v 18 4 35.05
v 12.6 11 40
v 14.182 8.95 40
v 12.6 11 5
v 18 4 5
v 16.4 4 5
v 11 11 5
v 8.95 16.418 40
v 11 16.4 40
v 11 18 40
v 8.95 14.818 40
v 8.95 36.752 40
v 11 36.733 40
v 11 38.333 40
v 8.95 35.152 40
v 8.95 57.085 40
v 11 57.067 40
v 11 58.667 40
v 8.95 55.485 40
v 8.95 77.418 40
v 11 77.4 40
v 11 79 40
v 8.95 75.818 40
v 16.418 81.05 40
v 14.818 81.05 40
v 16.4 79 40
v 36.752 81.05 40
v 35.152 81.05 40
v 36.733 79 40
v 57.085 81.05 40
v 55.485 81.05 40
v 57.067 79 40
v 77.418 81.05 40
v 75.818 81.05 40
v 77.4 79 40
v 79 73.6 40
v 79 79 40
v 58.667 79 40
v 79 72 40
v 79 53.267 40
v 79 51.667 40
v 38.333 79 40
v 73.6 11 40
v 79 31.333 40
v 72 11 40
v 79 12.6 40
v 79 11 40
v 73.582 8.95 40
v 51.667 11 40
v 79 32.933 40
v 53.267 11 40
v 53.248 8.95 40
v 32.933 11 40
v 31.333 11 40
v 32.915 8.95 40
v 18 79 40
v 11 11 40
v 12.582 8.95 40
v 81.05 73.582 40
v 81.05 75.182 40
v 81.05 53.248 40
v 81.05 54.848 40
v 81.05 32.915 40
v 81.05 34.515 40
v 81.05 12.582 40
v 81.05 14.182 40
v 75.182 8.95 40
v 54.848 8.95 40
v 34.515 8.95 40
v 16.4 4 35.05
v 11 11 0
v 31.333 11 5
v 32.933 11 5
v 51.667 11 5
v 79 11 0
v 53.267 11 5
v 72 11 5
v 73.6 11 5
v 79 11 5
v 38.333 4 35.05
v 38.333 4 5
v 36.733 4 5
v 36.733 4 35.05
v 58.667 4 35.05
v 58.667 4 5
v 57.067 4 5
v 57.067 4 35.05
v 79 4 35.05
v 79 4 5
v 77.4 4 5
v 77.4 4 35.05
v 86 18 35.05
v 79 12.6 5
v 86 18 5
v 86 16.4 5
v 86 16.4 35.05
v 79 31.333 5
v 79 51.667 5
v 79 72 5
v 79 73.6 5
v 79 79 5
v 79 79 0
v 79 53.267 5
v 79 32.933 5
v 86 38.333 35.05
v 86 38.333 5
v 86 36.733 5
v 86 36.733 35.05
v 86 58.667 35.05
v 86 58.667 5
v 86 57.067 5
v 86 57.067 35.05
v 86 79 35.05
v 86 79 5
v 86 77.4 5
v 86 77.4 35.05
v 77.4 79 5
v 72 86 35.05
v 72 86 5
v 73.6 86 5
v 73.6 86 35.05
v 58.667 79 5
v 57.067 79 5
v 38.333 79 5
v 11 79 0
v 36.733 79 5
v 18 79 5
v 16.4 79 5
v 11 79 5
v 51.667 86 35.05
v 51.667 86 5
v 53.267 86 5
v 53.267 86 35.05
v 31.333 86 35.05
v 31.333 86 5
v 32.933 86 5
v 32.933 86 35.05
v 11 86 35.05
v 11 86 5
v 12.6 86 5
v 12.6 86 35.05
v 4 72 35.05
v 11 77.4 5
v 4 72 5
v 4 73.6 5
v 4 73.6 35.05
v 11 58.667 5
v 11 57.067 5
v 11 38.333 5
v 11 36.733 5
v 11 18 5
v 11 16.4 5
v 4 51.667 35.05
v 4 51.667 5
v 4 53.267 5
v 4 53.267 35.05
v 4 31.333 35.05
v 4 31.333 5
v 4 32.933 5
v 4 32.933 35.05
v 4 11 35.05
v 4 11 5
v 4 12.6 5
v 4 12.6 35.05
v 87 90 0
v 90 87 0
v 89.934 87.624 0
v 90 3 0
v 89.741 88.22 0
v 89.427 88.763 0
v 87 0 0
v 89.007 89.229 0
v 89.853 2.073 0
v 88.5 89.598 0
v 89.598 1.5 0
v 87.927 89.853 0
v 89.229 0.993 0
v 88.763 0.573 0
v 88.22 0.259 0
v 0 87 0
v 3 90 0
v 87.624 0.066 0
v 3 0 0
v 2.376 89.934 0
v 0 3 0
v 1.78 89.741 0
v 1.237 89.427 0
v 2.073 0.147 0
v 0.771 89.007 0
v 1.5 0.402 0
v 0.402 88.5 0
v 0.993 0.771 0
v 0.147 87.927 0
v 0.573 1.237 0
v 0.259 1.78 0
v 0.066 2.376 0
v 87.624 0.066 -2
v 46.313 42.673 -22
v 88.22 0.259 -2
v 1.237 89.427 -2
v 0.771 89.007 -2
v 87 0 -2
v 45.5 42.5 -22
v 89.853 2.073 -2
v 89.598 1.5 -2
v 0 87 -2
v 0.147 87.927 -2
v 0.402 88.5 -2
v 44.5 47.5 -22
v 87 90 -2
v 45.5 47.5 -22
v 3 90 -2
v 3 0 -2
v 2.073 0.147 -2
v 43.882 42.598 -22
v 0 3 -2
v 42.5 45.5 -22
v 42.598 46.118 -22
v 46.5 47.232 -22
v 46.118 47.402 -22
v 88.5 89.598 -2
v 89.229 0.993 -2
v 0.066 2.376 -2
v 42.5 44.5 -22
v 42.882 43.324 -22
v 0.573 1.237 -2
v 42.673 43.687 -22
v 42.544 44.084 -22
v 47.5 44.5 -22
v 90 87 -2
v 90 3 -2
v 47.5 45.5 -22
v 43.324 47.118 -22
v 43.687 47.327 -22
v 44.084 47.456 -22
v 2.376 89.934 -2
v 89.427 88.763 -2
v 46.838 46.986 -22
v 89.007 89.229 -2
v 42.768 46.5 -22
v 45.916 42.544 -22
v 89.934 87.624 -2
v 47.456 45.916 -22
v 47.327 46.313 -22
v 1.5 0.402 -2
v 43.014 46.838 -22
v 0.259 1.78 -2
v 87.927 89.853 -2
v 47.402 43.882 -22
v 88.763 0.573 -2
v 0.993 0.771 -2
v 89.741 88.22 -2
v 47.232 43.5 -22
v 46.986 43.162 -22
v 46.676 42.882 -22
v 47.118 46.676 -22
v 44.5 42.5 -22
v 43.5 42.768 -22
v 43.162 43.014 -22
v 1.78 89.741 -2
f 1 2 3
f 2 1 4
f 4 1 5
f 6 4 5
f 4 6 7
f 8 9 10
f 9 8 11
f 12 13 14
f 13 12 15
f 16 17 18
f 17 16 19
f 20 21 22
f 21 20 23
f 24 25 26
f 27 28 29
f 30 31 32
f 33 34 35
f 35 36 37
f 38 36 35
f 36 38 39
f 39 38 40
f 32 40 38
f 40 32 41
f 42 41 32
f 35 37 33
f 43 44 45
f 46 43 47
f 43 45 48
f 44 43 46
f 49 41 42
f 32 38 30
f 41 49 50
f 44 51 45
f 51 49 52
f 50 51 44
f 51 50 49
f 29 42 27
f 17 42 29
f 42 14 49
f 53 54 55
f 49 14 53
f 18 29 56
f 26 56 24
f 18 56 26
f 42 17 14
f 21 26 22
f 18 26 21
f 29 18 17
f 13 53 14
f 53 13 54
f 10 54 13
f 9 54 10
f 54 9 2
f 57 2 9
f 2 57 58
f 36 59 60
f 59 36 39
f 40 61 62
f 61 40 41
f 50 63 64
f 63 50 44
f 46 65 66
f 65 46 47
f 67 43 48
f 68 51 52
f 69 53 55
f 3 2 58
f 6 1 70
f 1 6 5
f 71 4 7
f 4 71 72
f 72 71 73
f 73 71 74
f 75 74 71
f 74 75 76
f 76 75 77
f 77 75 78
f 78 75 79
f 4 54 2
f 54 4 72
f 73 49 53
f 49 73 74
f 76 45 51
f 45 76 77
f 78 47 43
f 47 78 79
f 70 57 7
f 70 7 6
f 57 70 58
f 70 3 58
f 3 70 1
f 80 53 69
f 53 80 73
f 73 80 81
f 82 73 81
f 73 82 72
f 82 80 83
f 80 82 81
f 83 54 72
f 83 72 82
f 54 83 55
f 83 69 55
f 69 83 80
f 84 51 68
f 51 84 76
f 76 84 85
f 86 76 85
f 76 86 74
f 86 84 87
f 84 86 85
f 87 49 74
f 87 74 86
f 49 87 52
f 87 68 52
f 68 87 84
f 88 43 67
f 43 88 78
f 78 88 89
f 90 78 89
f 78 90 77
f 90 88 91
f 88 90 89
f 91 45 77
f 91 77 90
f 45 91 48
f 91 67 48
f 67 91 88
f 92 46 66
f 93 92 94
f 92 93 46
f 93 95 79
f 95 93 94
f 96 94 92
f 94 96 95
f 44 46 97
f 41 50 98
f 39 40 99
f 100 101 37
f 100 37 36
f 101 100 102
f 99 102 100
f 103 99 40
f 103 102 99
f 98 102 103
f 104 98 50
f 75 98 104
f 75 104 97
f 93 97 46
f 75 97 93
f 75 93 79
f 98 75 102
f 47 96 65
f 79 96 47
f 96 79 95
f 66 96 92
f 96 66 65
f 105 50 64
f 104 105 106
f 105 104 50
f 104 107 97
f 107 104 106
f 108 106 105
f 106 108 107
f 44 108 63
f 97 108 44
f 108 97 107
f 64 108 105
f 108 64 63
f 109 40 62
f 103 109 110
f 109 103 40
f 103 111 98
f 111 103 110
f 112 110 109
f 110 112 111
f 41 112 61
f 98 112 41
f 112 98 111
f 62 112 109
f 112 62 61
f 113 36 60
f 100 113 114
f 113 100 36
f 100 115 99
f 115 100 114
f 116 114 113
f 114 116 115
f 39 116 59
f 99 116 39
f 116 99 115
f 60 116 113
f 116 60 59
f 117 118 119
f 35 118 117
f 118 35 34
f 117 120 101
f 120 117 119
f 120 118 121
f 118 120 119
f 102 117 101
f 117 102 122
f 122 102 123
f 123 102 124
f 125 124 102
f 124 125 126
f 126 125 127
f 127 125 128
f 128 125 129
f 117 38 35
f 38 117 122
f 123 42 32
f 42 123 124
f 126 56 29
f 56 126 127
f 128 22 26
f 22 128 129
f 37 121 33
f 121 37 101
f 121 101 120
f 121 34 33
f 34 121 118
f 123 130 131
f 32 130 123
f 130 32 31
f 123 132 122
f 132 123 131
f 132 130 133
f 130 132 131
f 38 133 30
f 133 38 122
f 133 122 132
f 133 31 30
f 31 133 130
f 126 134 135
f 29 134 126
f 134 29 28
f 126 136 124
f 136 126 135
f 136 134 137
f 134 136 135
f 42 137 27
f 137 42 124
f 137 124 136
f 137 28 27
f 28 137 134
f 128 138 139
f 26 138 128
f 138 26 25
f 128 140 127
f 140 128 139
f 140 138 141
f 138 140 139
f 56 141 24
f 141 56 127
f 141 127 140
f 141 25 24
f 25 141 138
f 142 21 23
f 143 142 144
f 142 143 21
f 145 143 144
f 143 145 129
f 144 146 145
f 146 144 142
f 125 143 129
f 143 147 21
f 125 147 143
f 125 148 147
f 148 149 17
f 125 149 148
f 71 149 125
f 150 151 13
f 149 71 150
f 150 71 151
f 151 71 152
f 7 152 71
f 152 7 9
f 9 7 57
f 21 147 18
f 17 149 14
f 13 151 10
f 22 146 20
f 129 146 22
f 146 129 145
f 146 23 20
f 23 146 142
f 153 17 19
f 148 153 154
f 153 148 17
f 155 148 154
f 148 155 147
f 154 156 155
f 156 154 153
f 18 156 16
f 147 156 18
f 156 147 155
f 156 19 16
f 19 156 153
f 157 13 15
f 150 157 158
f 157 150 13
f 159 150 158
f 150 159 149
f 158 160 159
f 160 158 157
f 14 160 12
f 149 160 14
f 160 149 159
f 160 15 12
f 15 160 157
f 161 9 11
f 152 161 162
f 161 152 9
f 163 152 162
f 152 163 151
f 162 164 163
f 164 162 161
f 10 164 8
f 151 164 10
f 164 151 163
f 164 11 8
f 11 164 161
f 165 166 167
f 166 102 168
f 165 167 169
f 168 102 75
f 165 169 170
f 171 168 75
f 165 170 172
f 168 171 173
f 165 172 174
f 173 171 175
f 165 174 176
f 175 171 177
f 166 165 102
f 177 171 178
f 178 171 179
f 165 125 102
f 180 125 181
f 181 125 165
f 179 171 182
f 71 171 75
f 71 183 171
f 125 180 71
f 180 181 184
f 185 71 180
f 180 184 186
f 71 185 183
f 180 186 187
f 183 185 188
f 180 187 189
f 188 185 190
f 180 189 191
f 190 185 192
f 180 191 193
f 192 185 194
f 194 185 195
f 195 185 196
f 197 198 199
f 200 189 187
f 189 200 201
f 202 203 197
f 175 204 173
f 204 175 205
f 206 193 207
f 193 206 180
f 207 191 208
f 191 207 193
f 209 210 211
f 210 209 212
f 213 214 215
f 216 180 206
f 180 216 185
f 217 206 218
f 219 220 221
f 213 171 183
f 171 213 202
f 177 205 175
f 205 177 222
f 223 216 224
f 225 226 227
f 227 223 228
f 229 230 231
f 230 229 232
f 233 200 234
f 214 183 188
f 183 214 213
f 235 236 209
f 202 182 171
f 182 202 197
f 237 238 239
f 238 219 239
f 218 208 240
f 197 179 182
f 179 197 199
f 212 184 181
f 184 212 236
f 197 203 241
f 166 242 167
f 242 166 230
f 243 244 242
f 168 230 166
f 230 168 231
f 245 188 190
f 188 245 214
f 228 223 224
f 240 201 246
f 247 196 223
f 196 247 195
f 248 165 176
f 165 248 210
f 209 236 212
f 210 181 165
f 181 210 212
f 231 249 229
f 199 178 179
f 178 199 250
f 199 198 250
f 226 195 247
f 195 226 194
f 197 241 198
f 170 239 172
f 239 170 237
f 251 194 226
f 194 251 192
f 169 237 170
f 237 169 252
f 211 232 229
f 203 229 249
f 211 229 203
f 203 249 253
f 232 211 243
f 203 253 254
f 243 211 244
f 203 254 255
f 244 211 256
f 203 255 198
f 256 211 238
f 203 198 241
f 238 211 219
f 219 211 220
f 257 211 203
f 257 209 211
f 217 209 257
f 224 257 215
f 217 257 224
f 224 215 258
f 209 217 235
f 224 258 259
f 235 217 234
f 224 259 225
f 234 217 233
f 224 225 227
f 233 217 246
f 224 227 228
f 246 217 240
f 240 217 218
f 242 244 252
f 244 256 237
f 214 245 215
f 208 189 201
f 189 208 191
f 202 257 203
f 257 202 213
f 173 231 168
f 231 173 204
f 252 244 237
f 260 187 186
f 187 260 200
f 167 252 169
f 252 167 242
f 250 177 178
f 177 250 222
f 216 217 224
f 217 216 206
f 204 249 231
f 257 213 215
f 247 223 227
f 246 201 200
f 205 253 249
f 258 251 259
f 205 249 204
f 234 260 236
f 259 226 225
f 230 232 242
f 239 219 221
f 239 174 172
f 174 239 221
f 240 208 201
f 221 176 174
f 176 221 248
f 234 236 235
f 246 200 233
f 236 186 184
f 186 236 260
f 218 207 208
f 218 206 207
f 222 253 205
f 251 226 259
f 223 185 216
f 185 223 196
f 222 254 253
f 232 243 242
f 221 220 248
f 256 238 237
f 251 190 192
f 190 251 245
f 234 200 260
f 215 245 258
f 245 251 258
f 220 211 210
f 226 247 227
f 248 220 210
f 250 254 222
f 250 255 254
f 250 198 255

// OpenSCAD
// Square tube cap

INSIDE = 80;
OVERHANG = 5;
ROUNDING = 3;
FIN = 6;
FIN_EXTRA = 1;
FIN_THICKNESS = 1.6;

top = INSIDE + 2*OVERHANG;

$fn = 30;

// Top
translate([0,0,-2]) hull() {
  linear_extrude(2)
    offset(ROUNDING) offset(-ROUNDING)
      square(top);
  translate([top/2, top/2, -20])
    linear_extrude(2)
      offset(2) offset(-2)
        #square(5, center=true);
}

// Bottom
translate([OVERHANG + FIN, OVERHANG + FIN, 0]) {
  cube([INSIDE - 2*FIN, INSIDE - 2*FIN, 40]);
//  difference() {
//    cube([INSIDE - 2*FIN, INSIDE - 2*FIN, 40]);
//    translate([5,5,0]) cube([INSIDE - 2*FIN - 10, INSIDE - 2*FIN - 10, 40+0.01]);
//  }
  translate([0,0,5]) {
    lw = INSIDE - 2*FIN;
    fins();
    translate([lw,0,0]) rotate([0,0,90]) fins();
    translate([lw, lw,0]) rotate([0,0,180]) fins();
    translate([0,lw,0]) rotate([0,0,270]) fins();
  }
}

module fins() {
  fx = FIN + FIN_EXTRA;
  mx = INSIDE - 2*FIN - fx;
  for (x = [0:mx/3:mx]) {
    difference() {
      translate([x,0,0]) linear_extrude(35) rotate(270) polygon([
        [0,0], [0,FIN_THICKNESS], [fx, fx], [fx,fx-FIN_THICKNESS]
      ]);
      translate([0,-fx,35]) rotate([45,0,0]) cube([INSIDE*2,fx,fx], center=true);
    }
  }
}
